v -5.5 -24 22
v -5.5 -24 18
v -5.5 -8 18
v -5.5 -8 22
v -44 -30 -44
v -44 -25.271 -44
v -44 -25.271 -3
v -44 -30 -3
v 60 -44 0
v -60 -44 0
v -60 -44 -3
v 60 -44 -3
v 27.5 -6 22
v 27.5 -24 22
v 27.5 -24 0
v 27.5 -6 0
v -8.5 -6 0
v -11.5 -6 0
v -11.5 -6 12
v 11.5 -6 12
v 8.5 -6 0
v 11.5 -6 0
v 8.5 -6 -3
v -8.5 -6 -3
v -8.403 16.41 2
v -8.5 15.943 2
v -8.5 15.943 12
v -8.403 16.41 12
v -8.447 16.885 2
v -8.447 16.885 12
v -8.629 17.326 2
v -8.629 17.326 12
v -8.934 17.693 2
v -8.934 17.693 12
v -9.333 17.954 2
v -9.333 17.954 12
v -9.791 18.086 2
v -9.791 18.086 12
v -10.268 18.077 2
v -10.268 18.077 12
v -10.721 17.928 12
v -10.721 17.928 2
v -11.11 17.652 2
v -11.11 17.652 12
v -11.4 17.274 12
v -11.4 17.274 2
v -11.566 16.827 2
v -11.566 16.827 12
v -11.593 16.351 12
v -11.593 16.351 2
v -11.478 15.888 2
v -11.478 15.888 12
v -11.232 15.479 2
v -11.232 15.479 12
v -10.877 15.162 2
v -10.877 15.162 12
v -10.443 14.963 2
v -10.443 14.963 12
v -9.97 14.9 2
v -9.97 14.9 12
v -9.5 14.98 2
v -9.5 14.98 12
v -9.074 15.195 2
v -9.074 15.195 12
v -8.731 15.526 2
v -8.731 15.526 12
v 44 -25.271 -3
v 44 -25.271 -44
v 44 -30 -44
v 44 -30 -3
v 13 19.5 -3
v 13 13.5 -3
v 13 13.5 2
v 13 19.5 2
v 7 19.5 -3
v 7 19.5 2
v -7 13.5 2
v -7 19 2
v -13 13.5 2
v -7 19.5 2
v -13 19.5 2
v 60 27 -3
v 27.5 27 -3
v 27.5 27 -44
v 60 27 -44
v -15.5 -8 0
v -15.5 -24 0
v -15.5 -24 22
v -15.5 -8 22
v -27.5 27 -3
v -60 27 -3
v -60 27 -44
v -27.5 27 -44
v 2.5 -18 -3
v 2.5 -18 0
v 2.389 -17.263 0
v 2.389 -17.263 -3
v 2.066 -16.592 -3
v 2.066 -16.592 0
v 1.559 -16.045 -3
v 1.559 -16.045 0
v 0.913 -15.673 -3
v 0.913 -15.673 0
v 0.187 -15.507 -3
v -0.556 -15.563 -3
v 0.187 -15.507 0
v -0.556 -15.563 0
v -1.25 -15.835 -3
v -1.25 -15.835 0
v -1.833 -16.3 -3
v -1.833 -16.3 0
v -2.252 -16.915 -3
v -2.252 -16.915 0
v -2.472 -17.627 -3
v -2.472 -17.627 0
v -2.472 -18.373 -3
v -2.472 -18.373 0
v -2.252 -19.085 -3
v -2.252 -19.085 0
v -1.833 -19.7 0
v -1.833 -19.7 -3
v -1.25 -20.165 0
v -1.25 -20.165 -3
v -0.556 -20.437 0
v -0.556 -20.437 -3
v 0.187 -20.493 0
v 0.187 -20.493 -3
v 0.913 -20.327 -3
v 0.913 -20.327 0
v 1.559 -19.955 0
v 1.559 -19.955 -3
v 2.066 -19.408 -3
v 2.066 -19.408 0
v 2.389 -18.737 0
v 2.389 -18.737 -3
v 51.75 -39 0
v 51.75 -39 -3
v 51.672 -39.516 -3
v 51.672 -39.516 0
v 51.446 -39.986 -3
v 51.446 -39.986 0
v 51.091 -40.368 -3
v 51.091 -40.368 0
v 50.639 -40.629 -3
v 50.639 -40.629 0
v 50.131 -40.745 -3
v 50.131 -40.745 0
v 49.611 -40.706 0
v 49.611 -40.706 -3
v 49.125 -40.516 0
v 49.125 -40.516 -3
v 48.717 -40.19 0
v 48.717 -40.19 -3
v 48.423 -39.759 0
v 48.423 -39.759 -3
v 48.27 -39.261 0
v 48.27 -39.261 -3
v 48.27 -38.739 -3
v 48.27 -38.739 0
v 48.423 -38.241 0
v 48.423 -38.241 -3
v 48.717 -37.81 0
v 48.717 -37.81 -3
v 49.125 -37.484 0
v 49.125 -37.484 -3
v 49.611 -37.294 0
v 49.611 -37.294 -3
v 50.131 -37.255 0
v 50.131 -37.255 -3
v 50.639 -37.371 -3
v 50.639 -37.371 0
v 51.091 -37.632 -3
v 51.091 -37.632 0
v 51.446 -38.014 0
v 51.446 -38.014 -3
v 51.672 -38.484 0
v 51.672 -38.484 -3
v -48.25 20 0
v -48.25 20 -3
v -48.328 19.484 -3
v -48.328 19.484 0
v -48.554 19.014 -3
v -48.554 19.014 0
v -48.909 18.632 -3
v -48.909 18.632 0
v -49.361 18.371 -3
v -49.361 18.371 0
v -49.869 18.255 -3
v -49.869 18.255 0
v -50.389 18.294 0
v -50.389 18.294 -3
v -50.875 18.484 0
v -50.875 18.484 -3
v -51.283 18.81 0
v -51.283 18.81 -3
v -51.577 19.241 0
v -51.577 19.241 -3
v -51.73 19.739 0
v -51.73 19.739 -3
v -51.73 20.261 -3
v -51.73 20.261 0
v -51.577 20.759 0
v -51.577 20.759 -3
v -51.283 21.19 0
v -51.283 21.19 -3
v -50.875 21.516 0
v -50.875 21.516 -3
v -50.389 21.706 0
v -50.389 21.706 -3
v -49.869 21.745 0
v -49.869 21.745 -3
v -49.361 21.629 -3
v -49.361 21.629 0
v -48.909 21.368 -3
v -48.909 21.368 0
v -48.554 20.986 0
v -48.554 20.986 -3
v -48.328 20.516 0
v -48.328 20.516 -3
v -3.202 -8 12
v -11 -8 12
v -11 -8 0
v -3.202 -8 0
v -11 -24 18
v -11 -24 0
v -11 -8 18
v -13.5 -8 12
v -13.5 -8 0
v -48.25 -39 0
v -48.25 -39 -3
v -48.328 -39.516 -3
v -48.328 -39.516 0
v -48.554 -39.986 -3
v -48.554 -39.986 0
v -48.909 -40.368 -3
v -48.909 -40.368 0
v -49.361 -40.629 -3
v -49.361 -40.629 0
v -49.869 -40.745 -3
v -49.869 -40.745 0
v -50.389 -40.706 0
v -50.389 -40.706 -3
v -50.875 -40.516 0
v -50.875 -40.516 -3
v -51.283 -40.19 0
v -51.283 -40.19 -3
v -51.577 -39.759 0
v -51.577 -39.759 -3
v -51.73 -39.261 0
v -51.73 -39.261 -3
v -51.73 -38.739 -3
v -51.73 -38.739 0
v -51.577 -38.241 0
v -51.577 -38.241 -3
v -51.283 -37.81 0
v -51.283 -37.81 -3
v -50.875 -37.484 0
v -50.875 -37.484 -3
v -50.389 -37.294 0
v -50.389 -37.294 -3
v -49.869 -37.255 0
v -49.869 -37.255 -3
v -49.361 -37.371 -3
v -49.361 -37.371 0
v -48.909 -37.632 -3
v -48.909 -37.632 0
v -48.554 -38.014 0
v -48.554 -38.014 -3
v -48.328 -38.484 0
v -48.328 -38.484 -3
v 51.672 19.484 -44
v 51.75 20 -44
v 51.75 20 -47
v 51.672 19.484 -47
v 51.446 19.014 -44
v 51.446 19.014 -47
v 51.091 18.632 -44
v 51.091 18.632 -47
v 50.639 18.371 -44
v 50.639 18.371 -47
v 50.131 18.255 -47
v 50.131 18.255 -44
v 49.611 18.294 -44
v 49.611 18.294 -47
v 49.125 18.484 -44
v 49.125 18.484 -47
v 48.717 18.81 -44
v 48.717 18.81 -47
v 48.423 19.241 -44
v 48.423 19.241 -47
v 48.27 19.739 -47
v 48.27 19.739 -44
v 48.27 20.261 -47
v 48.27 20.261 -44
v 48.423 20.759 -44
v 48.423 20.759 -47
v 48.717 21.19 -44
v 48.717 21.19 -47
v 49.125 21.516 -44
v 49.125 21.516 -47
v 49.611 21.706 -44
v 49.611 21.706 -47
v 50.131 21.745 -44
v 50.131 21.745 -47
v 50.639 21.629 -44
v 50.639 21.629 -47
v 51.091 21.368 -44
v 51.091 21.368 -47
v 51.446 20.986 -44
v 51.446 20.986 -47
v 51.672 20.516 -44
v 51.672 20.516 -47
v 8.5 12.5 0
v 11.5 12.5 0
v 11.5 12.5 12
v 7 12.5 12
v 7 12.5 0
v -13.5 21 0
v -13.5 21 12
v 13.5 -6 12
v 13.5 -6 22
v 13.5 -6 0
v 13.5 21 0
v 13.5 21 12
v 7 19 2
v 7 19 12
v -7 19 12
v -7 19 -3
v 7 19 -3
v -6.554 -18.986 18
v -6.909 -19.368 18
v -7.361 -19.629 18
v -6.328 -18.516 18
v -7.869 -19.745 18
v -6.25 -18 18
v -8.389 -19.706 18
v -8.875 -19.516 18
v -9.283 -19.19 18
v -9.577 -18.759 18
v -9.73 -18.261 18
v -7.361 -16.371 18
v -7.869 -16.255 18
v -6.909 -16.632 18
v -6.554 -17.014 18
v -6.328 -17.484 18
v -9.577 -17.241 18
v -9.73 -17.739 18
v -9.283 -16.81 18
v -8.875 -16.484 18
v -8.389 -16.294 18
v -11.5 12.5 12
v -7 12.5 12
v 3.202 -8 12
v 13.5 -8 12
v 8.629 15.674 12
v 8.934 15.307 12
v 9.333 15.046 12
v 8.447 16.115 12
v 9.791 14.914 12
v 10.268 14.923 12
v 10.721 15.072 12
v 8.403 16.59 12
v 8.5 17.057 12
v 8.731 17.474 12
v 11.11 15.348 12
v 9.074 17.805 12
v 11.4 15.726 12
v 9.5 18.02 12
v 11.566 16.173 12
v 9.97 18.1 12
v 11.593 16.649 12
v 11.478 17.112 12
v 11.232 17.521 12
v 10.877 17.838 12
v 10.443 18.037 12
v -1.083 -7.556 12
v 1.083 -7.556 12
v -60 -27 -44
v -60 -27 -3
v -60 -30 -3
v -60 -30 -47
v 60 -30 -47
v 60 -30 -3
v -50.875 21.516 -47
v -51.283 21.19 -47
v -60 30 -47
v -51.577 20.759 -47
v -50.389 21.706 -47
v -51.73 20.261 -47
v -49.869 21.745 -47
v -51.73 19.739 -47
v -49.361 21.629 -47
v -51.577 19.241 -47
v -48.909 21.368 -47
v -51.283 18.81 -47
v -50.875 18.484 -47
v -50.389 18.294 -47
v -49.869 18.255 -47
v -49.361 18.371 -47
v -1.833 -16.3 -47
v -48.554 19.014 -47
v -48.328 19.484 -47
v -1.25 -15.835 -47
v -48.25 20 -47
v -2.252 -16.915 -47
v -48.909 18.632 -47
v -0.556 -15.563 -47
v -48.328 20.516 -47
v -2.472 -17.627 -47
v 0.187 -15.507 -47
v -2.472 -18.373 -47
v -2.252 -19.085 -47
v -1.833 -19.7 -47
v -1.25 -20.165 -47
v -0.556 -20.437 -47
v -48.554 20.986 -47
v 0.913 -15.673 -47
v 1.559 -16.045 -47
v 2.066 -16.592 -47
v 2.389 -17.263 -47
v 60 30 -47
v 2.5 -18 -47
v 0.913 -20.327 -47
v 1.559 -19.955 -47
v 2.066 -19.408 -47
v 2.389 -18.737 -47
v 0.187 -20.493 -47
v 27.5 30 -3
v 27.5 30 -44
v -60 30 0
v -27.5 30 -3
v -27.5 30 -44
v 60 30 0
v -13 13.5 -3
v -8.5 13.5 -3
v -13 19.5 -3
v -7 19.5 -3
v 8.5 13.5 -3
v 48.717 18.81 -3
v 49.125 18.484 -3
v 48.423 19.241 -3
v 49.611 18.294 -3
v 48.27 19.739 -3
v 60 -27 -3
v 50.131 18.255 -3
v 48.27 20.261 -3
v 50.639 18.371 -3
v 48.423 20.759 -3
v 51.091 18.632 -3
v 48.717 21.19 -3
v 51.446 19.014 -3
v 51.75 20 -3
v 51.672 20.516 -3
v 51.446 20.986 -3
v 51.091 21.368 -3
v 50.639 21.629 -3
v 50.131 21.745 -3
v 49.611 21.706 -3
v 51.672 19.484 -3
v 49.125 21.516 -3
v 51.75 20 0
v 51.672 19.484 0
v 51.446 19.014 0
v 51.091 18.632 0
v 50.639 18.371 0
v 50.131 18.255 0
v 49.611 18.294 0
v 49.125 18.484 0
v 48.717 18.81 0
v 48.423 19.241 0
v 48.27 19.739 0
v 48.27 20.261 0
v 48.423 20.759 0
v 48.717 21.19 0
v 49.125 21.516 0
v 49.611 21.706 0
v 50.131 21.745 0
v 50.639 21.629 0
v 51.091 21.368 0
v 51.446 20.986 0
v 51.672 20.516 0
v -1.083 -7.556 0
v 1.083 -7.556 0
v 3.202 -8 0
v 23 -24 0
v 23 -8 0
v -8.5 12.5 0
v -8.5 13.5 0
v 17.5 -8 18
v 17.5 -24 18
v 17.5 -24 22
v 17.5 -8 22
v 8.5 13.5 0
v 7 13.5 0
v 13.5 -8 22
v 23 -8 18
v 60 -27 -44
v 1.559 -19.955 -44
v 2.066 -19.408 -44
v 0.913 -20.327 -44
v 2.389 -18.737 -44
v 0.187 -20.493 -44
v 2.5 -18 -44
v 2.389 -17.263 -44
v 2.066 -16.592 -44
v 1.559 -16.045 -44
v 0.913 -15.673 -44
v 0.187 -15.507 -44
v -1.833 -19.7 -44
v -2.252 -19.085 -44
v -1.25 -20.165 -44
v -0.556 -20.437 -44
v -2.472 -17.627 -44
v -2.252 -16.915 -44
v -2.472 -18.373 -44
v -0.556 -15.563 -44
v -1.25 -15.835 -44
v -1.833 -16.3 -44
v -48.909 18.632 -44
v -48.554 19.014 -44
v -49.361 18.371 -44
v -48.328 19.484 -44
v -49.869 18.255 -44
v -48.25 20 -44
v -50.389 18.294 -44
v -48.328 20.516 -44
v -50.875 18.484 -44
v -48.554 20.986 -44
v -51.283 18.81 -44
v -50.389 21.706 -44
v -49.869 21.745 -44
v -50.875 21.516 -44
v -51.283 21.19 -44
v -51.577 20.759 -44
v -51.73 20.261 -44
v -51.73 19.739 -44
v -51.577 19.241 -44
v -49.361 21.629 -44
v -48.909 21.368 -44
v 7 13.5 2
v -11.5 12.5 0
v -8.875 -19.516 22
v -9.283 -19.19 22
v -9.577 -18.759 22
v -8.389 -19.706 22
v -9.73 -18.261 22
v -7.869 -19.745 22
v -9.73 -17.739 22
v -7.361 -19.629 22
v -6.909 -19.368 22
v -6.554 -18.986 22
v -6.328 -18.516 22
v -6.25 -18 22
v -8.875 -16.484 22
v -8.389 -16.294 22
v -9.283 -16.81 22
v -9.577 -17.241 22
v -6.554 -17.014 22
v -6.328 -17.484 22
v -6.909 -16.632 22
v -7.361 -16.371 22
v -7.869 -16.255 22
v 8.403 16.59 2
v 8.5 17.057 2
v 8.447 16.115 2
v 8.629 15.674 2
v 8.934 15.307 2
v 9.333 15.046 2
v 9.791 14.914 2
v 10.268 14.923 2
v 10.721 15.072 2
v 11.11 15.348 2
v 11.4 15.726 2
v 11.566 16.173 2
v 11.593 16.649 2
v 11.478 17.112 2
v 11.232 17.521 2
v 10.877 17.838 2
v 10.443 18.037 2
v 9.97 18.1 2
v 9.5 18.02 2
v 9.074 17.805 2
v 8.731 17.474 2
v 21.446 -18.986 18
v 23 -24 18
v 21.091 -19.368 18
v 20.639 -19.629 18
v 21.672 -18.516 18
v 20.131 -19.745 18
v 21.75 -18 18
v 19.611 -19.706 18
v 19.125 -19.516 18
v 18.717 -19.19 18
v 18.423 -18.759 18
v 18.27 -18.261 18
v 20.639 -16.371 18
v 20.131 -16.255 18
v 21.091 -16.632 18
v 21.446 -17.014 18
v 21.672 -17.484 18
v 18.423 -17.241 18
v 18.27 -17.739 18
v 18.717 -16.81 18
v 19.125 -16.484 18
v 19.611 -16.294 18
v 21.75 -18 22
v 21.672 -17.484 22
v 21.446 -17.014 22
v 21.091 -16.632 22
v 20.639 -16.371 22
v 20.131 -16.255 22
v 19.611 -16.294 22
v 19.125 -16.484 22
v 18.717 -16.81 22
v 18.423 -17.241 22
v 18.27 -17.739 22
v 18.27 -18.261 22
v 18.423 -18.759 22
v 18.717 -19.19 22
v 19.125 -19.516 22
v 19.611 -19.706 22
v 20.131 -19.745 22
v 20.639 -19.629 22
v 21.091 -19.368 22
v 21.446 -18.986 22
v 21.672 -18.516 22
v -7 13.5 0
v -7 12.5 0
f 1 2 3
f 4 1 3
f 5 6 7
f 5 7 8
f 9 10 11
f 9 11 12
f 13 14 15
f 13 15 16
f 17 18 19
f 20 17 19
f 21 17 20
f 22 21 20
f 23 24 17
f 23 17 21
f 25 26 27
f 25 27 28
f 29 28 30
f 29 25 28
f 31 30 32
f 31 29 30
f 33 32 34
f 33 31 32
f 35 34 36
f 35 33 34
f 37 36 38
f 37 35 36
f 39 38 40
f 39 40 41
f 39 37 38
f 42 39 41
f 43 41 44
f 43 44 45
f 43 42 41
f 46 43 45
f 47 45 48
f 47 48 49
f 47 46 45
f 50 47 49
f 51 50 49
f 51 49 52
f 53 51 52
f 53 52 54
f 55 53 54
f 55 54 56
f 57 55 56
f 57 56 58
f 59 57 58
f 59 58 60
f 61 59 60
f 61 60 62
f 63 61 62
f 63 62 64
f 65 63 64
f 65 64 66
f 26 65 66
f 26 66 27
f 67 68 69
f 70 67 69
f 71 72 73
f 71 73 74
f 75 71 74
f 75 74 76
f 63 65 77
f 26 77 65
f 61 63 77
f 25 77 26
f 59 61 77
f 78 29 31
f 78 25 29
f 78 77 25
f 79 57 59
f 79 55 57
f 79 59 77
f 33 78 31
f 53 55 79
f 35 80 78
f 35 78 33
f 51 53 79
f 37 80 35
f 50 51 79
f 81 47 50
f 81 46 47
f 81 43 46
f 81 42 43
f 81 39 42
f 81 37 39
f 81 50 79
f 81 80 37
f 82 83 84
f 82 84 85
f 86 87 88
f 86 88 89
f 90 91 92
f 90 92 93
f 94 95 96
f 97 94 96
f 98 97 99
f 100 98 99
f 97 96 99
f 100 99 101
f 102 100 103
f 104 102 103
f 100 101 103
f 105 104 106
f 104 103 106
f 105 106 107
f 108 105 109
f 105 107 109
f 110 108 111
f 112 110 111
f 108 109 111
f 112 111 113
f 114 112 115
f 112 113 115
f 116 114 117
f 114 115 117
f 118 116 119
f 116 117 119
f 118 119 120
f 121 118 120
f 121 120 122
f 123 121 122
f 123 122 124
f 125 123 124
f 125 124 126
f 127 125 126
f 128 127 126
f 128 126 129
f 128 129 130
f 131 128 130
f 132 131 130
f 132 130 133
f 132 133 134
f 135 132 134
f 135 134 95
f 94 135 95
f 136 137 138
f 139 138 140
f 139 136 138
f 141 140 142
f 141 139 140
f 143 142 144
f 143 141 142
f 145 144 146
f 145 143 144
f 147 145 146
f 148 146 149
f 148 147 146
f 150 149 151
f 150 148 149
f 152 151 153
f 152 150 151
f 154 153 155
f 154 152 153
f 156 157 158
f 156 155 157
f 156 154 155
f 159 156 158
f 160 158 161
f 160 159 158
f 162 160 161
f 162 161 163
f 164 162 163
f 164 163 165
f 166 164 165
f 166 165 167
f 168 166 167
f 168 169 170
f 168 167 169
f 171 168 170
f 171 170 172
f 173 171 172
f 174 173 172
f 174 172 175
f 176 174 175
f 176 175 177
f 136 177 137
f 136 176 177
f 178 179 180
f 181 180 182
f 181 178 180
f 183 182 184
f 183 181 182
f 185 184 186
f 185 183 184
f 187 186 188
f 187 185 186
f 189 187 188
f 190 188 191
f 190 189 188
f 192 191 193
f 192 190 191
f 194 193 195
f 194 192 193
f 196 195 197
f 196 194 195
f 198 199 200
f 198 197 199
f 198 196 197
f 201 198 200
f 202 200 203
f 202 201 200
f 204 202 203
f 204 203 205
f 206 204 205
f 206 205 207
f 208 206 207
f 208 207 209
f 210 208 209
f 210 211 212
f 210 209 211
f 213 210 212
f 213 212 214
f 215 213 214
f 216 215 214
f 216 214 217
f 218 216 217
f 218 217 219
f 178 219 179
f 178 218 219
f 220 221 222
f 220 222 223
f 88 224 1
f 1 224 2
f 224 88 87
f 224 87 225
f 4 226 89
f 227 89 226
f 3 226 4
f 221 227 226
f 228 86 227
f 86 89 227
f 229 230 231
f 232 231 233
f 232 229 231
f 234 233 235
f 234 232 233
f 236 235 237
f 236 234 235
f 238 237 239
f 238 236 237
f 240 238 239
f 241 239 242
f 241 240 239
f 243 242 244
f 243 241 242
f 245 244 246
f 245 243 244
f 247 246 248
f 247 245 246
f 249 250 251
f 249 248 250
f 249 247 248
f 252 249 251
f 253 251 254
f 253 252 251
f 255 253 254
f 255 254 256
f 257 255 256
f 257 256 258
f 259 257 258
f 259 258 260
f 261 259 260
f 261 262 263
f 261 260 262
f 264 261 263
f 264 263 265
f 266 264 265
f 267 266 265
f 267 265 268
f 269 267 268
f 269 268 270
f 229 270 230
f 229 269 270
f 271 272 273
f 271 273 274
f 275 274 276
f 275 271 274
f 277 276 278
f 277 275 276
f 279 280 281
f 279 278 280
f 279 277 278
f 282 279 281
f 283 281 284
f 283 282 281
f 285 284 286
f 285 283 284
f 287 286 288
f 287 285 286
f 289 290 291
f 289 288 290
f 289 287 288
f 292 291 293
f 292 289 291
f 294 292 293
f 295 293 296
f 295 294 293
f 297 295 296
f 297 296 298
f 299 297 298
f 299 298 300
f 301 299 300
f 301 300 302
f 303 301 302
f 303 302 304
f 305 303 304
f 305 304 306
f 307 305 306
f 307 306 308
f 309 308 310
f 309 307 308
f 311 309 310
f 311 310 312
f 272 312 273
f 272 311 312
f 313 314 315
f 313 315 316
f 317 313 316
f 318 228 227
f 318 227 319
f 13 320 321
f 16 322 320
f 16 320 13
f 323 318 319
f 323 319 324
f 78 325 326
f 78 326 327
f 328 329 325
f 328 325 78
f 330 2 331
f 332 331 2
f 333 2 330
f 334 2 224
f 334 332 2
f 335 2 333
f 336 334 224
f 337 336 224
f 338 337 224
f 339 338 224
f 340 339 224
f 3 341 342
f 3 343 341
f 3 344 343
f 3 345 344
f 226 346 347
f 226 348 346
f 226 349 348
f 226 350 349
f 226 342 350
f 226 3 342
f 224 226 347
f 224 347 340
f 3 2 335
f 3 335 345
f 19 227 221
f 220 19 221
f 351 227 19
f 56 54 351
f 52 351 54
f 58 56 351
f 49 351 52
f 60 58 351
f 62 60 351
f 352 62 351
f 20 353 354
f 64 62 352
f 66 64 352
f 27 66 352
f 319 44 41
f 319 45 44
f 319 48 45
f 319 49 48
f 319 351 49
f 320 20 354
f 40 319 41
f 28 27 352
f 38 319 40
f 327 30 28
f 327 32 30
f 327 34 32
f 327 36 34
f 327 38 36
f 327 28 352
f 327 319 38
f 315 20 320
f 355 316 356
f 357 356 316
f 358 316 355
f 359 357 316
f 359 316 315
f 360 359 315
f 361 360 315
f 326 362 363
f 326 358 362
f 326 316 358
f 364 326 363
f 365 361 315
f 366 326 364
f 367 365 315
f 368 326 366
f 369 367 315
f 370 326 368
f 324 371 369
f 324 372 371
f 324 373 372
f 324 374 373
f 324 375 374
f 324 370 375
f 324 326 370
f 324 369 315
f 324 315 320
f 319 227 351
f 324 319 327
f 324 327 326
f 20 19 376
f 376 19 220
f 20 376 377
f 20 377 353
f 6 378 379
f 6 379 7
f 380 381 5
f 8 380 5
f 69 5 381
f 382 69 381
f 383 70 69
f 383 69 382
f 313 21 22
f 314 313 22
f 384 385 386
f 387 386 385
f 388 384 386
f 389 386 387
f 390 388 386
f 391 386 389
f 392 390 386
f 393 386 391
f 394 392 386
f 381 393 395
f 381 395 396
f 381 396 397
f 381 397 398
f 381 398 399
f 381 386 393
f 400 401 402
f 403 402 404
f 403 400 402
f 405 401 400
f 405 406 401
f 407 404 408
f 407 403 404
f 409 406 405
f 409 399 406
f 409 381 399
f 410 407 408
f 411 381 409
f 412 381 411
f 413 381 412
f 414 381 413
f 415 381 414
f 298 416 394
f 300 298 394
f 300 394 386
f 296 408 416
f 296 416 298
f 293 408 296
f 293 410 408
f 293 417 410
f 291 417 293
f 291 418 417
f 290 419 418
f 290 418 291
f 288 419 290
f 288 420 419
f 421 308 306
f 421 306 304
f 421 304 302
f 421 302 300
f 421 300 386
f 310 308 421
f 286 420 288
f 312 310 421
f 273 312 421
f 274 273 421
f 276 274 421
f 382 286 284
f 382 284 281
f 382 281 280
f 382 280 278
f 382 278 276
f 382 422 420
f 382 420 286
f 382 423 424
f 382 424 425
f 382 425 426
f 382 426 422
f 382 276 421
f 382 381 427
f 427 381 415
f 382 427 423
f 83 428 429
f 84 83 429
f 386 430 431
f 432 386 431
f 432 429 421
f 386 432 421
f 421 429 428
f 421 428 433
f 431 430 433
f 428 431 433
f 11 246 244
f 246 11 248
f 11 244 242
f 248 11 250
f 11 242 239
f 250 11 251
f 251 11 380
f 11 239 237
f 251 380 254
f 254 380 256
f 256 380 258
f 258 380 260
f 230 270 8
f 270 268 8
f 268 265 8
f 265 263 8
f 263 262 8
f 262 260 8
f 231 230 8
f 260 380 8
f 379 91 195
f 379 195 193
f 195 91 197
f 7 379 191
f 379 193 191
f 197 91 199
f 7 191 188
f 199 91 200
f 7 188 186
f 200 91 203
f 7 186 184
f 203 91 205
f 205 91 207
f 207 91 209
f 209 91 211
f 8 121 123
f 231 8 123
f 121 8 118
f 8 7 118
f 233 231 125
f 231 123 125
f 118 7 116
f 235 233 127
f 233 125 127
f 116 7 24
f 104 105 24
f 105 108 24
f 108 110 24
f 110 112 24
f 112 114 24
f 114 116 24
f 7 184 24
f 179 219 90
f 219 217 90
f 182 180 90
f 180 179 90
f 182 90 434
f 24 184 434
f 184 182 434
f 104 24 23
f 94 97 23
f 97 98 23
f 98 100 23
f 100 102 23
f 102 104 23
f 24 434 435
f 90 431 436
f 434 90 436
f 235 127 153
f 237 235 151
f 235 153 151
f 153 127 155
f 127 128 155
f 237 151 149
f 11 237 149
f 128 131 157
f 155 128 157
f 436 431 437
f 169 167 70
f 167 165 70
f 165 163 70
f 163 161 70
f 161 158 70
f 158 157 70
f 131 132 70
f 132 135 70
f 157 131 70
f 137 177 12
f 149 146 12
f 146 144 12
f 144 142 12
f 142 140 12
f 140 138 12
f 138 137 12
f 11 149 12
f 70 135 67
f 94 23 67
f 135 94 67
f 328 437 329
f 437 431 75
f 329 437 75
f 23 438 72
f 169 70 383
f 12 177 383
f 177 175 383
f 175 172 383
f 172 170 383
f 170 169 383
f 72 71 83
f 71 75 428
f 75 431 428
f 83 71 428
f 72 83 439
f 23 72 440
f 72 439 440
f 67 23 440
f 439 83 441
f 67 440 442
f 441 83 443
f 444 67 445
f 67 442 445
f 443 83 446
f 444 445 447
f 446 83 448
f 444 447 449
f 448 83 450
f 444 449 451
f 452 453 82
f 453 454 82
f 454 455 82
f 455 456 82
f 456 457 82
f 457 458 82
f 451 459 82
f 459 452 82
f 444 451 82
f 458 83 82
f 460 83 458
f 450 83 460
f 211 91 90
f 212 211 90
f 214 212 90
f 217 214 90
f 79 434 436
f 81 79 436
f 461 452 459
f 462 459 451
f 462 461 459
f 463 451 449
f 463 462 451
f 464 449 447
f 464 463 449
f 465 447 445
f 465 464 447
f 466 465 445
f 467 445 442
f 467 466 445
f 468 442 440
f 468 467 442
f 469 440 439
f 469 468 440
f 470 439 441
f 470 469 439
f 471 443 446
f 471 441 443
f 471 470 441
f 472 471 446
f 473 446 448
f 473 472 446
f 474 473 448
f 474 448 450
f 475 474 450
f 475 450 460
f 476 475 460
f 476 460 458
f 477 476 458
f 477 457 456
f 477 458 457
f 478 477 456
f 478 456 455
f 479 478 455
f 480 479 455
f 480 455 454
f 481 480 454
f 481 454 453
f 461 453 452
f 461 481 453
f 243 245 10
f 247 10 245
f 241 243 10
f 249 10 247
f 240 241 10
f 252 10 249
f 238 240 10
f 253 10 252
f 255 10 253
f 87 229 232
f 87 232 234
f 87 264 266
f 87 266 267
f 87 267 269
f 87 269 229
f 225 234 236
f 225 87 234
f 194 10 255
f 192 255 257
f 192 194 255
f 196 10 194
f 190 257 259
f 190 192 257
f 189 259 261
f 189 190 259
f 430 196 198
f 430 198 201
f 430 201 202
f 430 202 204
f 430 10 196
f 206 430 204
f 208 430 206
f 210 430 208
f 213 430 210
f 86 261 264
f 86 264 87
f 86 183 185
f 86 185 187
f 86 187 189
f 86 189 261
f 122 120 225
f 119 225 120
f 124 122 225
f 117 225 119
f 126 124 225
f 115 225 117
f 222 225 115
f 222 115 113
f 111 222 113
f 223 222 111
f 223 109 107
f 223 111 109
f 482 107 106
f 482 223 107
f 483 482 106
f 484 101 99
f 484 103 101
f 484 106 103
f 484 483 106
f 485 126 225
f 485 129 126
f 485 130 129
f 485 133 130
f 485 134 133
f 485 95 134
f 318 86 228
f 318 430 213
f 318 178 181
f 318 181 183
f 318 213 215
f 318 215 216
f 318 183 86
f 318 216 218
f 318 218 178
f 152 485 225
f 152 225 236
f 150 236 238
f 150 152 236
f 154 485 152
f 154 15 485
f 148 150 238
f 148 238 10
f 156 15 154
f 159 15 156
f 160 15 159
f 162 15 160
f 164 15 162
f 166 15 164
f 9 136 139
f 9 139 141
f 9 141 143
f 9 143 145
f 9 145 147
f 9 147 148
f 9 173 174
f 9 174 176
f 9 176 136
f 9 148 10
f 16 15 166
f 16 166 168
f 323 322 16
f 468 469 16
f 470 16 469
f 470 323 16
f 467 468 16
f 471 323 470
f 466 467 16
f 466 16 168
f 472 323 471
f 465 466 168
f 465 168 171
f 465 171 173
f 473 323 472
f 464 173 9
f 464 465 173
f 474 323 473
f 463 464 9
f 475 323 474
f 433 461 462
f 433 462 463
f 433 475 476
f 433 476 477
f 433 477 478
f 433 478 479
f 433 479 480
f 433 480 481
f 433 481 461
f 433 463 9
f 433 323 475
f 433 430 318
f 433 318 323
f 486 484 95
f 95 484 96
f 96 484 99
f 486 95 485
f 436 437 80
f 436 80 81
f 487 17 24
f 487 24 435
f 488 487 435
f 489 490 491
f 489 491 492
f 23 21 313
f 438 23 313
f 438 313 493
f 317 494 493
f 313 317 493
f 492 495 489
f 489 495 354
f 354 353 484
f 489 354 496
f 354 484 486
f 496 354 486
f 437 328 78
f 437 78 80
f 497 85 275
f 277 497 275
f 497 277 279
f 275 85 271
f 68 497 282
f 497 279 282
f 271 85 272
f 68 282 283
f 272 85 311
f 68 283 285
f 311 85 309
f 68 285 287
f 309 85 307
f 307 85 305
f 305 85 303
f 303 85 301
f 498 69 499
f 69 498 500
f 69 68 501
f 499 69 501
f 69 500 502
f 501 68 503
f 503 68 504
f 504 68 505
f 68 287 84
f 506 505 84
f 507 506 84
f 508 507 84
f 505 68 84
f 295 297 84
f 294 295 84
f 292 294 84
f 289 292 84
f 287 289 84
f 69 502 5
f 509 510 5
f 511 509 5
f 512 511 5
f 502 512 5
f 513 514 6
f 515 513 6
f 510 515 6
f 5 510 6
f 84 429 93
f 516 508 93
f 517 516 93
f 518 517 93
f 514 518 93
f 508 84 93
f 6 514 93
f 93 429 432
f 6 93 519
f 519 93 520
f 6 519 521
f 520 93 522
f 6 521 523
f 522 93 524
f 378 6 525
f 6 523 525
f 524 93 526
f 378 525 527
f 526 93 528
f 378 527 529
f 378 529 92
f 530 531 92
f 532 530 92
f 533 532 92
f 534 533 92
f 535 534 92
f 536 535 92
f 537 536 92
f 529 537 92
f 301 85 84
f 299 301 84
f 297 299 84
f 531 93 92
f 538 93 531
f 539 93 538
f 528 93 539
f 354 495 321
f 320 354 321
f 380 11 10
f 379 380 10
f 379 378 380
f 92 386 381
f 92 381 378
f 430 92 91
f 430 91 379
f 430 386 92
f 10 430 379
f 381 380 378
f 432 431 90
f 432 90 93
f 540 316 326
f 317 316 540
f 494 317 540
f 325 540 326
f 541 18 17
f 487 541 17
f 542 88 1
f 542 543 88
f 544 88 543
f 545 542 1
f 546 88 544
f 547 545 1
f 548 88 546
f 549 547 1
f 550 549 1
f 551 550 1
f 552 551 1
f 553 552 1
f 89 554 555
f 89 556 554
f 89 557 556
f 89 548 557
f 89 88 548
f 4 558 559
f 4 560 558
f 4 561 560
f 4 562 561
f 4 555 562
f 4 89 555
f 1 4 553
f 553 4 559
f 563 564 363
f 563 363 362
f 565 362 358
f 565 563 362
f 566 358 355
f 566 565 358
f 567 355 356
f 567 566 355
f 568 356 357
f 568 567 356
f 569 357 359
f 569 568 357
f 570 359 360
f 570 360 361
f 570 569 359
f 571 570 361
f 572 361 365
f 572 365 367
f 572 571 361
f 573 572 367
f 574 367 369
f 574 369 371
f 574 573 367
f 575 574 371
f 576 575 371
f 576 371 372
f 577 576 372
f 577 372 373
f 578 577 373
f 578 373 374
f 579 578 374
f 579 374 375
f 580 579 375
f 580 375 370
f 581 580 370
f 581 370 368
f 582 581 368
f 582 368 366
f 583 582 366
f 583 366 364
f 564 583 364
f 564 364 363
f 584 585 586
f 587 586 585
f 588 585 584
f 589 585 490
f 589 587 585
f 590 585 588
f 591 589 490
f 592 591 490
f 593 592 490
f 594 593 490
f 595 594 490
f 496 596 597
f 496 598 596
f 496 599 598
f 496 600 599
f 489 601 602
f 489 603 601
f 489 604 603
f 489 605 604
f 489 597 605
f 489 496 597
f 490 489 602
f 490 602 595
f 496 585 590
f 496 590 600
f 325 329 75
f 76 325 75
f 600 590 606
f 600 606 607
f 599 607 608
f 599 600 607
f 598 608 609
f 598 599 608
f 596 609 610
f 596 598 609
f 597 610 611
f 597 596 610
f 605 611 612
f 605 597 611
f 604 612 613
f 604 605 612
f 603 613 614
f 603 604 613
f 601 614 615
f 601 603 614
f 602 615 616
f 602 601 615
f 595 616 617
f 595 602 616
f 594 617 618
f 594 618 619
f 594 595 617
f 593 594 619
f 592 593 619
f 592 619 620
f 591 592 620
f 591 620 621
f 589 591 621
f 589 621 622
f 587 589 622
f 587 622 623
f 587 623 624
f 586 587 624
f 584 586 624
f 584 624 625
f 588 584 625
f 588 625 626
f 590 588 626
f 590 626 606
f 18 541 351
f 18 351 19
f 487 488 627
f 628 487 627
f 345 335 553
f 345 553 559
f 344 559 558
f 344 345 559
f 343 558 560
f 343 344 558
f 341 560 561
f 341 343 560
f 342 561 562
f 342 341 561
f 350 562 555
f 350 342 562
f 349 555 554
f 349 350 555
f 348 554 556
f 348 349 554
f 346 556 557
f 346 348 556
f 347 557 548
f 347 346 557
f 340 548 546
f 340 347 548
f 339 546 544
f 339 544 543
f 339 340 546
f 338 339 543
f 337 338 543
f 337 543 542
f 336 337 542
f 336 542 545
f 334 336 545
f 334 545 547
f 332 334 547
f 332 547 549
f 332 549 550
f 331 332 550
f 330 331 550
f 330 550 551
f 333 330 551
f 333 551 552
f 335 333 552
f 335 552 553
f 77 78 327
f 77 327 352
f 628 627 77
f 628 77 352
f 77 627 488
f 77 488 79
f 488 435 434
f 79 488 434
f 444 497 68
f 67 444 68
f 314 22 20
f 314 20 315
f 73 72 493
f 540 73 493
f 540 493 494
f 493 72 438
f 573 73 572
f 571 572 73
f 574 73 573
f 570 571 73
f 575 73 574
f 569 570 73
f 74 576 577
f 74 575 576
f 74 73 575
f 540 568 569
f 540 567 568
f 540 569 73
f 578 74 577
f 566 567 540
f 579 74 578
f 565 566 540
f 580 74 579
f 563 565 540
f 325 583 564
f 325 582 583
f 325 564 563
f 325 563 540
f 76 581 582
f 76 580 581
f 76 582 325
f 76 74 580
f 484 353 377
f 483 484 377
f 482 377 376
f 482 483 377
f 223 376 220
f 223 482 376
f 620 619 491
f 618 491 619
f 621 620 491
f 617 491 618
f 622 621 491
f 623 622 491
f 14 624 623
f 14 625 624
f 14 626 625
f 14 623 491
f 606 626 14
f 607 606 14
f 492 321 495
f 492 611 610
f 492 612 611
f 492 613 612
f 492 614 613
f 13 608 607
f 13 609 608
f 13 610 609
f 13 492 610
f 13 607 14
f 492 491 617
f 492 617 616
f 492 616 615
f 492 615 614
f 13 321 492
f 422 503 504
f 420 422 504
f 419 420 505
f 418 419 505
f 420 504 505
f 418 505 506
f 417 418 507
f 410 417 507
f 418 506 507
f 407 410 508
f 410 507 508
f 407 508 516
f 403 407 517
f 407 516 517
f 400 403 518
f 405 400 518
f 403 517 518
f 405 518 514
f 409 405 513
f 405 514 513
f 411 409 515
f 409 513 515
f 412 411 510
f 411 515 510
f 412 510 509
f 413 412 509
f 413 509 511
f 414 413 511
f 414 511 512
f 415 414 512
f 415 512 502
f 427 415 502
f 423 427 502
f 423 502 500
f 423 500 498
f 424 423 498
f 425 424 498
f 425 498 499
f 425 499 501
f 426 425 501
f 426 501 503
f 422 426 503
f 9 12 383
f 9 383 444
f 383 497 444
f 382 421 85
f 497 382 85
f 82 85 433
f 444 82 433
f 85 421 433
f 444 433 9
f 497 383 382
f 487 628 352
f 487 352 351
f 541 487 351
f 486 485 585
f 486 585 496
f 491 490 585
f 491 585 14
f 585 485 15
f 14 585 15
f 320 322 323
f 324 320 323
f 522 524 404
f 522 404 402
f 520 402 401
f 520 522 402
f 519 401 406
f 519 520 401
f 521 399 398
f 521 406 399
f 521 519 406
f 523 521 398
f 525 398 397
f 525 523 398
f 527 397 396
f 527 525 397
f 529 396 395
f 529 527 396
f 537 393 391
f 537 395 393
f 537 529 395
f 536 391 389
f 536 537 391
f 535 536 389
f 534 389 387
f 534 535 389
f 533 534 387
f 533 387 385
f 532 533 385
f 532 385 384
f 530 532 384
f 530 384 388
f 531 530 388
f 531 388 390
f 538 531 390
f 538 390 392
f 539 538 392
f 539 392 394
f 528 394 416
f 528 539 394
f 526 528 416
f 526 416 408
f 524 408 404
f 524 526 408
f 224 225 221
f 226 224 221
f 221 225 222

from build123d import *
from build123d.topology import SkipClean

# Parameters (mm, degrees)
SKETCH_1_W           = 120
SKETCH_1_H           = 60
EXTRUDE_1_DEPTH      = 47
SHELL_2_T            = -3
SKETCH_2_W           = 55
SKETCH_2_H           = 41
CUT_EXTRUDE_1_DEPTH  = 3
SKETCH_5_W           = 88
SKETCH_5_H           = 41
CUT_EXTRUDE_3_DEPTH  = 10
SKETCH_6_R           = 2.5
CUT_EXTRUDE_4_DEPTH  = 82.908485519
EXTRUDE_4_REACH      = 82.225
CUT_EXTRUDE_5_REACH  = 83.908
SKETCH_9_W           = 17
SKETCH_9_H           = 25
SKETCH_10_W          = 27
SKETCH_10_H          = 29
SKETCH_10_R          = 1.6
EXTRUDE_5_DEPTH      = 12
SKETCH_14_W          = 10
SKETCH_14_H          = 16
SKETCH_14_R          = 1.75
EXTRUDE_7_DEPTH      = 22
SKETCH_15_R          = 10.5
CUT_EXTRUDE_7_DEPTH  = 12
CUT_EXTRUDE_8_DEPTH  = 6
CUT_EXTRUDE_9_REACH  = 83.908
SKETCH_19_W          = 34
SKETCH_19_H          = 16
SKETCH_16_W          = 14
SKETCH_16_H          = 2
EXTRUDE_8_DEPTH      = 22
SKETCH_20_W          = 6
SKETCH_20_H          = 6
CUT_EXTRUDE_10_DEPTH = 5
SKETCH_21_W          = 120
SKETCH_21_H          = 3
EXTRUDE_9_DEPTH      = 14
SKETCH_11_R          = 1.75
CUT_EXTRUDE_6_DEPTH  = 89.005681635


with BuildPart() as part:
    # 草图1 → 凸台-拉伸1 (new body)
    with BuildSketch(Plane(origin=(0, 0, 0), x_dir=(1, 0, 0), z_dir=(0, 0, -1))):
        Rectangle(SKETCH_1_W, SKETCH_1_H)
    extrude(amount=EXTRUDE_1_DEPTH)

    # 抽壳2
    shell_2_openings = [part.faces().sort_by_distance(p)[0] for p in [
        (60, 0, -23.5),
        (-60, 0, -23.5),
    ]]
    offset(amount=SHELL_2_T, openings=shell_2_openings, kind=Kind.INTERSECTION)

    # 草图2 → 切除-拉伸1 (cut)
    with BuildSketch(Plane(origin=(0, 30, 45), x_dir=(-1, 0, 0), z_dir=(0, -1, 0))):
        with Locations((0, 68.5)):
            Rectangle(SKETCH_2_W, SKETCH_2_H)
    extrude(amount=CUT_EXTRUDE_1_DEPTH, mode=Mode.SUBTRACT)

    # 草图5 → 切除-拉伸3 (cut)
    with BuildSketch(Plane.XZ.offset(30)):
        with Locations((0, -23.5)):
            Rectangle(SKETCH_5_W, SKETCH_5_H)
    extrude(amount=-CUT_EXTRUDE_3_DEPTH, mode=Mode.SUBTRACT)

    # 草图6 → 切除-拉伸4 (cut, through all)
    with BuildSketch(Plane.XY):
        with Locations((0, -18)):
            Circle(SKETCH_6_R)
    extrude(amount=-CUT_EXTRUDE_4_DEPTH, mode=Mode.SUBTRACT)

    # 草图8 → 凸台-拉伸4 (add, up to next)
    with BuildSketch(Plane(origin=(0, 0, -44), x_dir=(-1, 0, 0), z_dir=(0, 0, -1)), mode=Mode.PRIVATE) as extrude_4_sk1:
        Polygon((-60, -27), (-44, -25.270549885), (-44, -30), (-60, -30), align=None)
    extrude_4_tool1 = extrude(extrude_4_sk1.sketch, amount=-EXTRUDE_4_REACH, mode=Mode.PRIVATE) - part.part
    extrude_4 = extrude_4_tool1.solids().sort_by_distance((51.403338, -28.035391, -44))[0]
    add(extrude_4)

    # 镜向1: 凸台-拉伸4 across plane
    add(extrude_4.mirror(Plane(origin=(0, 0, 0), x_dir=(0, 0, 1), z_dir=(1, 0, 0))))

    # 草图9 → 切除-拉伸5 (cut, up to next)
    with BuildSketch(Plane.XY, mode=Mode.PRIVATE) as cut_extrude_5_sk1:
        with Locations((0, 6.5)):
            Rectangle(SKETCH_9_W, SKETCH_9_H)
    cut_extrude_5_tool1 = extrude(cut_extrude_5_sk1.sketch, amount=-CUT_EXTRUDE_5_REACH, mode=Mode.PRIVATE) & part.part
    add(cut_extrude_5_tool1.solids().sort_by_distance((0, 6.5, 0))[0], mode=Mode.SUBTRACT)

    # 草图10 → 凸台-拉伸5 (add)
    with BuildSketch(Plane.XY):
        with Locations((0, 6.5)):
            Rectangle(SKETCH_10_W, SKETCH_10_H)
        with Locations(Location((-10, 16.5, 0), (0, 0, 339.635865194))):
            Circle(SKETCH_10_R, mode=Mode.SUBTRACT)
        with Locations(Location((10, 16.5, 0), (0, 0, 159.635865194))):
            Circle(SKETCH_10_R, mode=Mode.SUBTRACT)
        Polygon((-11.5, -6), (11.5, -6), (11.5, 12.5), (7, 12.5), (7, 19), (-7, 19), (-7, 12.5), (-11.5, 12.5), align=None, mode=Mode.SUBTRACT)
    extrude(amount=EXTRUDE_5_DEPTH)

    # 草图14 → 凸台-拉伸7 (add)
    # profile 1 of 2: a face of its own
    with BuildSketch(Plane.XY):
        with Locations((-10.5, -16)):
            Rectangle(SKETCH_14_W, SKETCH_14_H)
        with Locations((-8, -18)):
            Circle(SKETCH_14_R, mode=Mode.SUBTRACT)
    # profile 2 of 2: a face of its own
    with BuildSketch(Plane.XY):
        with Locations((22.5, -16)):
            Rectangle(SKETCH_14_W, SKETCH_14_H)
        with Locations((20, -18)):
            Circle(SKETCH_14_R, mode=Mode.SUBTRACT)
    extrude(amount=EXTRUDE_7_DEPTH)

    # 草图15 → 切除-拉伸7 (cut)
    with BuildSketch(Plane.XY):
        with Locations((0, -18)):
            Circle(SKETCH_15_R)
    extrude(amount=CUT_EXTRUDE_7_DEPTH, mode=Mode.SUBTRACT)

    # 草图17 → 切除-拉伸8 (cut)
    with SkipClean():  # the faces are left unmerged after this step: merging them gives an invalid solid
        with BuildSketch(Plane(origin=(0, 0, 12), x_dir=(-1, 0, 0), z_dir=(0, 0, -1))):
            with BuildLine():
                Line((5.5, -9.05572809), (5.5, -24))
                Line((5.5, -24), (8.61684397, -24))
                ThreePointArc((8.61684397, -24), (10.278819808, -15.856203519), (5.5, -9.05572809))
            make_face()
        extrude(amount=-CUT_EXTRUDE_8_DEPTH, mode=Mode.SUBTRACT)

    # 切除-拉伸9: up to this face of the body (flat: up to its plane)
    cut_extrude_9_end = Plane(part.part.faces().sort_by_distance((-5.657585298, -16.527864045, 18))[0])
    # 草图19 → 切除-拉伸9 (cut, up to the picked face)
    with BuildSketch(Plane.XY, mode=Mode.PRIVATE) as cut_extrude_9_sk1:
        with Locations((6, -16)):
            Rectangle(SKETCH_19_W, SKETCH_19_H)
    cut_extrude_9_tool1 = split(extrude(cut_extrude_9_sk1.sketch, amount=CUT_EXTRUDE_9_REACH, mode=Mode.PRIVATE), bisect_by=cut_extrude_9_end, keep=Keep.BOTH, mode=Mode.PRIVATE)
    add(cut_extrude_9_tool1.solids().sort_by(Axis((6, -16, 0), (0, 0, 1)))[0], mode=Mode.SUBTRACT)

    # 草图16 → 凸台-拉伸8 (add)
    with BuildSketch(Plane.XY):
        with Locations((20.5, -7)):
            Rectangle(SKETCH_16_W, SKETCH_16_H)
    extrude(amount=EXTRUDE_8_DEPTH)

    # 草图20 → 切除-拉伸10 (cut)
    with BuildSketch(Plane(origin=(0, 0, -3), x_dir=(-1, 0, 0), z_dir=(0, 0, -1))):
        with Locations((-10, 16.5)):
            Rectangle(SKETCH_20_W, SKETCH_20_H)
        with Locations((10, 16.5)):
            Rectangle(SKETCH_20_W, SKETCH_20_H)
    extrude(amount=-CUT_EXTRUDE_10_DEPTH, mode=Mode.SUBTRACT)

    # 草图21 → 凸台-拉伸9 (add)
    with BuildSketch(Plane.XZ.offset(30)):
        with Locations((0, -1.5)):
            Rectangle(SKETCH_21_W, SKETCH_21_H)
    extrude(amount=EXTRUDE_9_DEPTH)

    # 草图11 → 切除-拉伸6 (cut, through all)
    with BuildSketch(Plane(origin=(0, 0, 0), x_dir=(-1, 0, 0), z_dir=(0, 0, -1))):
        with Locations(Location((-50, 20, 0), (0, 0, 180))):
            Circle(SKETCH_11_R)
        with Locations(Location((50, 20, 0), (0, 0, 180))):
            Circle(SKETCH_11_R)
        with Locations(Location((-50, -39, 0), (0, 0, 180))):
            Circle(SKETCH_11_R)
        with Locations(Location((50, -39, 0), (0, 0, 180))):
            Circle(SKETCH_11_R)
    extrude(amount=CUT_EXTRUDE_6_DEPTH, mode=Mode.SUBTRACT)


solid = part.part
